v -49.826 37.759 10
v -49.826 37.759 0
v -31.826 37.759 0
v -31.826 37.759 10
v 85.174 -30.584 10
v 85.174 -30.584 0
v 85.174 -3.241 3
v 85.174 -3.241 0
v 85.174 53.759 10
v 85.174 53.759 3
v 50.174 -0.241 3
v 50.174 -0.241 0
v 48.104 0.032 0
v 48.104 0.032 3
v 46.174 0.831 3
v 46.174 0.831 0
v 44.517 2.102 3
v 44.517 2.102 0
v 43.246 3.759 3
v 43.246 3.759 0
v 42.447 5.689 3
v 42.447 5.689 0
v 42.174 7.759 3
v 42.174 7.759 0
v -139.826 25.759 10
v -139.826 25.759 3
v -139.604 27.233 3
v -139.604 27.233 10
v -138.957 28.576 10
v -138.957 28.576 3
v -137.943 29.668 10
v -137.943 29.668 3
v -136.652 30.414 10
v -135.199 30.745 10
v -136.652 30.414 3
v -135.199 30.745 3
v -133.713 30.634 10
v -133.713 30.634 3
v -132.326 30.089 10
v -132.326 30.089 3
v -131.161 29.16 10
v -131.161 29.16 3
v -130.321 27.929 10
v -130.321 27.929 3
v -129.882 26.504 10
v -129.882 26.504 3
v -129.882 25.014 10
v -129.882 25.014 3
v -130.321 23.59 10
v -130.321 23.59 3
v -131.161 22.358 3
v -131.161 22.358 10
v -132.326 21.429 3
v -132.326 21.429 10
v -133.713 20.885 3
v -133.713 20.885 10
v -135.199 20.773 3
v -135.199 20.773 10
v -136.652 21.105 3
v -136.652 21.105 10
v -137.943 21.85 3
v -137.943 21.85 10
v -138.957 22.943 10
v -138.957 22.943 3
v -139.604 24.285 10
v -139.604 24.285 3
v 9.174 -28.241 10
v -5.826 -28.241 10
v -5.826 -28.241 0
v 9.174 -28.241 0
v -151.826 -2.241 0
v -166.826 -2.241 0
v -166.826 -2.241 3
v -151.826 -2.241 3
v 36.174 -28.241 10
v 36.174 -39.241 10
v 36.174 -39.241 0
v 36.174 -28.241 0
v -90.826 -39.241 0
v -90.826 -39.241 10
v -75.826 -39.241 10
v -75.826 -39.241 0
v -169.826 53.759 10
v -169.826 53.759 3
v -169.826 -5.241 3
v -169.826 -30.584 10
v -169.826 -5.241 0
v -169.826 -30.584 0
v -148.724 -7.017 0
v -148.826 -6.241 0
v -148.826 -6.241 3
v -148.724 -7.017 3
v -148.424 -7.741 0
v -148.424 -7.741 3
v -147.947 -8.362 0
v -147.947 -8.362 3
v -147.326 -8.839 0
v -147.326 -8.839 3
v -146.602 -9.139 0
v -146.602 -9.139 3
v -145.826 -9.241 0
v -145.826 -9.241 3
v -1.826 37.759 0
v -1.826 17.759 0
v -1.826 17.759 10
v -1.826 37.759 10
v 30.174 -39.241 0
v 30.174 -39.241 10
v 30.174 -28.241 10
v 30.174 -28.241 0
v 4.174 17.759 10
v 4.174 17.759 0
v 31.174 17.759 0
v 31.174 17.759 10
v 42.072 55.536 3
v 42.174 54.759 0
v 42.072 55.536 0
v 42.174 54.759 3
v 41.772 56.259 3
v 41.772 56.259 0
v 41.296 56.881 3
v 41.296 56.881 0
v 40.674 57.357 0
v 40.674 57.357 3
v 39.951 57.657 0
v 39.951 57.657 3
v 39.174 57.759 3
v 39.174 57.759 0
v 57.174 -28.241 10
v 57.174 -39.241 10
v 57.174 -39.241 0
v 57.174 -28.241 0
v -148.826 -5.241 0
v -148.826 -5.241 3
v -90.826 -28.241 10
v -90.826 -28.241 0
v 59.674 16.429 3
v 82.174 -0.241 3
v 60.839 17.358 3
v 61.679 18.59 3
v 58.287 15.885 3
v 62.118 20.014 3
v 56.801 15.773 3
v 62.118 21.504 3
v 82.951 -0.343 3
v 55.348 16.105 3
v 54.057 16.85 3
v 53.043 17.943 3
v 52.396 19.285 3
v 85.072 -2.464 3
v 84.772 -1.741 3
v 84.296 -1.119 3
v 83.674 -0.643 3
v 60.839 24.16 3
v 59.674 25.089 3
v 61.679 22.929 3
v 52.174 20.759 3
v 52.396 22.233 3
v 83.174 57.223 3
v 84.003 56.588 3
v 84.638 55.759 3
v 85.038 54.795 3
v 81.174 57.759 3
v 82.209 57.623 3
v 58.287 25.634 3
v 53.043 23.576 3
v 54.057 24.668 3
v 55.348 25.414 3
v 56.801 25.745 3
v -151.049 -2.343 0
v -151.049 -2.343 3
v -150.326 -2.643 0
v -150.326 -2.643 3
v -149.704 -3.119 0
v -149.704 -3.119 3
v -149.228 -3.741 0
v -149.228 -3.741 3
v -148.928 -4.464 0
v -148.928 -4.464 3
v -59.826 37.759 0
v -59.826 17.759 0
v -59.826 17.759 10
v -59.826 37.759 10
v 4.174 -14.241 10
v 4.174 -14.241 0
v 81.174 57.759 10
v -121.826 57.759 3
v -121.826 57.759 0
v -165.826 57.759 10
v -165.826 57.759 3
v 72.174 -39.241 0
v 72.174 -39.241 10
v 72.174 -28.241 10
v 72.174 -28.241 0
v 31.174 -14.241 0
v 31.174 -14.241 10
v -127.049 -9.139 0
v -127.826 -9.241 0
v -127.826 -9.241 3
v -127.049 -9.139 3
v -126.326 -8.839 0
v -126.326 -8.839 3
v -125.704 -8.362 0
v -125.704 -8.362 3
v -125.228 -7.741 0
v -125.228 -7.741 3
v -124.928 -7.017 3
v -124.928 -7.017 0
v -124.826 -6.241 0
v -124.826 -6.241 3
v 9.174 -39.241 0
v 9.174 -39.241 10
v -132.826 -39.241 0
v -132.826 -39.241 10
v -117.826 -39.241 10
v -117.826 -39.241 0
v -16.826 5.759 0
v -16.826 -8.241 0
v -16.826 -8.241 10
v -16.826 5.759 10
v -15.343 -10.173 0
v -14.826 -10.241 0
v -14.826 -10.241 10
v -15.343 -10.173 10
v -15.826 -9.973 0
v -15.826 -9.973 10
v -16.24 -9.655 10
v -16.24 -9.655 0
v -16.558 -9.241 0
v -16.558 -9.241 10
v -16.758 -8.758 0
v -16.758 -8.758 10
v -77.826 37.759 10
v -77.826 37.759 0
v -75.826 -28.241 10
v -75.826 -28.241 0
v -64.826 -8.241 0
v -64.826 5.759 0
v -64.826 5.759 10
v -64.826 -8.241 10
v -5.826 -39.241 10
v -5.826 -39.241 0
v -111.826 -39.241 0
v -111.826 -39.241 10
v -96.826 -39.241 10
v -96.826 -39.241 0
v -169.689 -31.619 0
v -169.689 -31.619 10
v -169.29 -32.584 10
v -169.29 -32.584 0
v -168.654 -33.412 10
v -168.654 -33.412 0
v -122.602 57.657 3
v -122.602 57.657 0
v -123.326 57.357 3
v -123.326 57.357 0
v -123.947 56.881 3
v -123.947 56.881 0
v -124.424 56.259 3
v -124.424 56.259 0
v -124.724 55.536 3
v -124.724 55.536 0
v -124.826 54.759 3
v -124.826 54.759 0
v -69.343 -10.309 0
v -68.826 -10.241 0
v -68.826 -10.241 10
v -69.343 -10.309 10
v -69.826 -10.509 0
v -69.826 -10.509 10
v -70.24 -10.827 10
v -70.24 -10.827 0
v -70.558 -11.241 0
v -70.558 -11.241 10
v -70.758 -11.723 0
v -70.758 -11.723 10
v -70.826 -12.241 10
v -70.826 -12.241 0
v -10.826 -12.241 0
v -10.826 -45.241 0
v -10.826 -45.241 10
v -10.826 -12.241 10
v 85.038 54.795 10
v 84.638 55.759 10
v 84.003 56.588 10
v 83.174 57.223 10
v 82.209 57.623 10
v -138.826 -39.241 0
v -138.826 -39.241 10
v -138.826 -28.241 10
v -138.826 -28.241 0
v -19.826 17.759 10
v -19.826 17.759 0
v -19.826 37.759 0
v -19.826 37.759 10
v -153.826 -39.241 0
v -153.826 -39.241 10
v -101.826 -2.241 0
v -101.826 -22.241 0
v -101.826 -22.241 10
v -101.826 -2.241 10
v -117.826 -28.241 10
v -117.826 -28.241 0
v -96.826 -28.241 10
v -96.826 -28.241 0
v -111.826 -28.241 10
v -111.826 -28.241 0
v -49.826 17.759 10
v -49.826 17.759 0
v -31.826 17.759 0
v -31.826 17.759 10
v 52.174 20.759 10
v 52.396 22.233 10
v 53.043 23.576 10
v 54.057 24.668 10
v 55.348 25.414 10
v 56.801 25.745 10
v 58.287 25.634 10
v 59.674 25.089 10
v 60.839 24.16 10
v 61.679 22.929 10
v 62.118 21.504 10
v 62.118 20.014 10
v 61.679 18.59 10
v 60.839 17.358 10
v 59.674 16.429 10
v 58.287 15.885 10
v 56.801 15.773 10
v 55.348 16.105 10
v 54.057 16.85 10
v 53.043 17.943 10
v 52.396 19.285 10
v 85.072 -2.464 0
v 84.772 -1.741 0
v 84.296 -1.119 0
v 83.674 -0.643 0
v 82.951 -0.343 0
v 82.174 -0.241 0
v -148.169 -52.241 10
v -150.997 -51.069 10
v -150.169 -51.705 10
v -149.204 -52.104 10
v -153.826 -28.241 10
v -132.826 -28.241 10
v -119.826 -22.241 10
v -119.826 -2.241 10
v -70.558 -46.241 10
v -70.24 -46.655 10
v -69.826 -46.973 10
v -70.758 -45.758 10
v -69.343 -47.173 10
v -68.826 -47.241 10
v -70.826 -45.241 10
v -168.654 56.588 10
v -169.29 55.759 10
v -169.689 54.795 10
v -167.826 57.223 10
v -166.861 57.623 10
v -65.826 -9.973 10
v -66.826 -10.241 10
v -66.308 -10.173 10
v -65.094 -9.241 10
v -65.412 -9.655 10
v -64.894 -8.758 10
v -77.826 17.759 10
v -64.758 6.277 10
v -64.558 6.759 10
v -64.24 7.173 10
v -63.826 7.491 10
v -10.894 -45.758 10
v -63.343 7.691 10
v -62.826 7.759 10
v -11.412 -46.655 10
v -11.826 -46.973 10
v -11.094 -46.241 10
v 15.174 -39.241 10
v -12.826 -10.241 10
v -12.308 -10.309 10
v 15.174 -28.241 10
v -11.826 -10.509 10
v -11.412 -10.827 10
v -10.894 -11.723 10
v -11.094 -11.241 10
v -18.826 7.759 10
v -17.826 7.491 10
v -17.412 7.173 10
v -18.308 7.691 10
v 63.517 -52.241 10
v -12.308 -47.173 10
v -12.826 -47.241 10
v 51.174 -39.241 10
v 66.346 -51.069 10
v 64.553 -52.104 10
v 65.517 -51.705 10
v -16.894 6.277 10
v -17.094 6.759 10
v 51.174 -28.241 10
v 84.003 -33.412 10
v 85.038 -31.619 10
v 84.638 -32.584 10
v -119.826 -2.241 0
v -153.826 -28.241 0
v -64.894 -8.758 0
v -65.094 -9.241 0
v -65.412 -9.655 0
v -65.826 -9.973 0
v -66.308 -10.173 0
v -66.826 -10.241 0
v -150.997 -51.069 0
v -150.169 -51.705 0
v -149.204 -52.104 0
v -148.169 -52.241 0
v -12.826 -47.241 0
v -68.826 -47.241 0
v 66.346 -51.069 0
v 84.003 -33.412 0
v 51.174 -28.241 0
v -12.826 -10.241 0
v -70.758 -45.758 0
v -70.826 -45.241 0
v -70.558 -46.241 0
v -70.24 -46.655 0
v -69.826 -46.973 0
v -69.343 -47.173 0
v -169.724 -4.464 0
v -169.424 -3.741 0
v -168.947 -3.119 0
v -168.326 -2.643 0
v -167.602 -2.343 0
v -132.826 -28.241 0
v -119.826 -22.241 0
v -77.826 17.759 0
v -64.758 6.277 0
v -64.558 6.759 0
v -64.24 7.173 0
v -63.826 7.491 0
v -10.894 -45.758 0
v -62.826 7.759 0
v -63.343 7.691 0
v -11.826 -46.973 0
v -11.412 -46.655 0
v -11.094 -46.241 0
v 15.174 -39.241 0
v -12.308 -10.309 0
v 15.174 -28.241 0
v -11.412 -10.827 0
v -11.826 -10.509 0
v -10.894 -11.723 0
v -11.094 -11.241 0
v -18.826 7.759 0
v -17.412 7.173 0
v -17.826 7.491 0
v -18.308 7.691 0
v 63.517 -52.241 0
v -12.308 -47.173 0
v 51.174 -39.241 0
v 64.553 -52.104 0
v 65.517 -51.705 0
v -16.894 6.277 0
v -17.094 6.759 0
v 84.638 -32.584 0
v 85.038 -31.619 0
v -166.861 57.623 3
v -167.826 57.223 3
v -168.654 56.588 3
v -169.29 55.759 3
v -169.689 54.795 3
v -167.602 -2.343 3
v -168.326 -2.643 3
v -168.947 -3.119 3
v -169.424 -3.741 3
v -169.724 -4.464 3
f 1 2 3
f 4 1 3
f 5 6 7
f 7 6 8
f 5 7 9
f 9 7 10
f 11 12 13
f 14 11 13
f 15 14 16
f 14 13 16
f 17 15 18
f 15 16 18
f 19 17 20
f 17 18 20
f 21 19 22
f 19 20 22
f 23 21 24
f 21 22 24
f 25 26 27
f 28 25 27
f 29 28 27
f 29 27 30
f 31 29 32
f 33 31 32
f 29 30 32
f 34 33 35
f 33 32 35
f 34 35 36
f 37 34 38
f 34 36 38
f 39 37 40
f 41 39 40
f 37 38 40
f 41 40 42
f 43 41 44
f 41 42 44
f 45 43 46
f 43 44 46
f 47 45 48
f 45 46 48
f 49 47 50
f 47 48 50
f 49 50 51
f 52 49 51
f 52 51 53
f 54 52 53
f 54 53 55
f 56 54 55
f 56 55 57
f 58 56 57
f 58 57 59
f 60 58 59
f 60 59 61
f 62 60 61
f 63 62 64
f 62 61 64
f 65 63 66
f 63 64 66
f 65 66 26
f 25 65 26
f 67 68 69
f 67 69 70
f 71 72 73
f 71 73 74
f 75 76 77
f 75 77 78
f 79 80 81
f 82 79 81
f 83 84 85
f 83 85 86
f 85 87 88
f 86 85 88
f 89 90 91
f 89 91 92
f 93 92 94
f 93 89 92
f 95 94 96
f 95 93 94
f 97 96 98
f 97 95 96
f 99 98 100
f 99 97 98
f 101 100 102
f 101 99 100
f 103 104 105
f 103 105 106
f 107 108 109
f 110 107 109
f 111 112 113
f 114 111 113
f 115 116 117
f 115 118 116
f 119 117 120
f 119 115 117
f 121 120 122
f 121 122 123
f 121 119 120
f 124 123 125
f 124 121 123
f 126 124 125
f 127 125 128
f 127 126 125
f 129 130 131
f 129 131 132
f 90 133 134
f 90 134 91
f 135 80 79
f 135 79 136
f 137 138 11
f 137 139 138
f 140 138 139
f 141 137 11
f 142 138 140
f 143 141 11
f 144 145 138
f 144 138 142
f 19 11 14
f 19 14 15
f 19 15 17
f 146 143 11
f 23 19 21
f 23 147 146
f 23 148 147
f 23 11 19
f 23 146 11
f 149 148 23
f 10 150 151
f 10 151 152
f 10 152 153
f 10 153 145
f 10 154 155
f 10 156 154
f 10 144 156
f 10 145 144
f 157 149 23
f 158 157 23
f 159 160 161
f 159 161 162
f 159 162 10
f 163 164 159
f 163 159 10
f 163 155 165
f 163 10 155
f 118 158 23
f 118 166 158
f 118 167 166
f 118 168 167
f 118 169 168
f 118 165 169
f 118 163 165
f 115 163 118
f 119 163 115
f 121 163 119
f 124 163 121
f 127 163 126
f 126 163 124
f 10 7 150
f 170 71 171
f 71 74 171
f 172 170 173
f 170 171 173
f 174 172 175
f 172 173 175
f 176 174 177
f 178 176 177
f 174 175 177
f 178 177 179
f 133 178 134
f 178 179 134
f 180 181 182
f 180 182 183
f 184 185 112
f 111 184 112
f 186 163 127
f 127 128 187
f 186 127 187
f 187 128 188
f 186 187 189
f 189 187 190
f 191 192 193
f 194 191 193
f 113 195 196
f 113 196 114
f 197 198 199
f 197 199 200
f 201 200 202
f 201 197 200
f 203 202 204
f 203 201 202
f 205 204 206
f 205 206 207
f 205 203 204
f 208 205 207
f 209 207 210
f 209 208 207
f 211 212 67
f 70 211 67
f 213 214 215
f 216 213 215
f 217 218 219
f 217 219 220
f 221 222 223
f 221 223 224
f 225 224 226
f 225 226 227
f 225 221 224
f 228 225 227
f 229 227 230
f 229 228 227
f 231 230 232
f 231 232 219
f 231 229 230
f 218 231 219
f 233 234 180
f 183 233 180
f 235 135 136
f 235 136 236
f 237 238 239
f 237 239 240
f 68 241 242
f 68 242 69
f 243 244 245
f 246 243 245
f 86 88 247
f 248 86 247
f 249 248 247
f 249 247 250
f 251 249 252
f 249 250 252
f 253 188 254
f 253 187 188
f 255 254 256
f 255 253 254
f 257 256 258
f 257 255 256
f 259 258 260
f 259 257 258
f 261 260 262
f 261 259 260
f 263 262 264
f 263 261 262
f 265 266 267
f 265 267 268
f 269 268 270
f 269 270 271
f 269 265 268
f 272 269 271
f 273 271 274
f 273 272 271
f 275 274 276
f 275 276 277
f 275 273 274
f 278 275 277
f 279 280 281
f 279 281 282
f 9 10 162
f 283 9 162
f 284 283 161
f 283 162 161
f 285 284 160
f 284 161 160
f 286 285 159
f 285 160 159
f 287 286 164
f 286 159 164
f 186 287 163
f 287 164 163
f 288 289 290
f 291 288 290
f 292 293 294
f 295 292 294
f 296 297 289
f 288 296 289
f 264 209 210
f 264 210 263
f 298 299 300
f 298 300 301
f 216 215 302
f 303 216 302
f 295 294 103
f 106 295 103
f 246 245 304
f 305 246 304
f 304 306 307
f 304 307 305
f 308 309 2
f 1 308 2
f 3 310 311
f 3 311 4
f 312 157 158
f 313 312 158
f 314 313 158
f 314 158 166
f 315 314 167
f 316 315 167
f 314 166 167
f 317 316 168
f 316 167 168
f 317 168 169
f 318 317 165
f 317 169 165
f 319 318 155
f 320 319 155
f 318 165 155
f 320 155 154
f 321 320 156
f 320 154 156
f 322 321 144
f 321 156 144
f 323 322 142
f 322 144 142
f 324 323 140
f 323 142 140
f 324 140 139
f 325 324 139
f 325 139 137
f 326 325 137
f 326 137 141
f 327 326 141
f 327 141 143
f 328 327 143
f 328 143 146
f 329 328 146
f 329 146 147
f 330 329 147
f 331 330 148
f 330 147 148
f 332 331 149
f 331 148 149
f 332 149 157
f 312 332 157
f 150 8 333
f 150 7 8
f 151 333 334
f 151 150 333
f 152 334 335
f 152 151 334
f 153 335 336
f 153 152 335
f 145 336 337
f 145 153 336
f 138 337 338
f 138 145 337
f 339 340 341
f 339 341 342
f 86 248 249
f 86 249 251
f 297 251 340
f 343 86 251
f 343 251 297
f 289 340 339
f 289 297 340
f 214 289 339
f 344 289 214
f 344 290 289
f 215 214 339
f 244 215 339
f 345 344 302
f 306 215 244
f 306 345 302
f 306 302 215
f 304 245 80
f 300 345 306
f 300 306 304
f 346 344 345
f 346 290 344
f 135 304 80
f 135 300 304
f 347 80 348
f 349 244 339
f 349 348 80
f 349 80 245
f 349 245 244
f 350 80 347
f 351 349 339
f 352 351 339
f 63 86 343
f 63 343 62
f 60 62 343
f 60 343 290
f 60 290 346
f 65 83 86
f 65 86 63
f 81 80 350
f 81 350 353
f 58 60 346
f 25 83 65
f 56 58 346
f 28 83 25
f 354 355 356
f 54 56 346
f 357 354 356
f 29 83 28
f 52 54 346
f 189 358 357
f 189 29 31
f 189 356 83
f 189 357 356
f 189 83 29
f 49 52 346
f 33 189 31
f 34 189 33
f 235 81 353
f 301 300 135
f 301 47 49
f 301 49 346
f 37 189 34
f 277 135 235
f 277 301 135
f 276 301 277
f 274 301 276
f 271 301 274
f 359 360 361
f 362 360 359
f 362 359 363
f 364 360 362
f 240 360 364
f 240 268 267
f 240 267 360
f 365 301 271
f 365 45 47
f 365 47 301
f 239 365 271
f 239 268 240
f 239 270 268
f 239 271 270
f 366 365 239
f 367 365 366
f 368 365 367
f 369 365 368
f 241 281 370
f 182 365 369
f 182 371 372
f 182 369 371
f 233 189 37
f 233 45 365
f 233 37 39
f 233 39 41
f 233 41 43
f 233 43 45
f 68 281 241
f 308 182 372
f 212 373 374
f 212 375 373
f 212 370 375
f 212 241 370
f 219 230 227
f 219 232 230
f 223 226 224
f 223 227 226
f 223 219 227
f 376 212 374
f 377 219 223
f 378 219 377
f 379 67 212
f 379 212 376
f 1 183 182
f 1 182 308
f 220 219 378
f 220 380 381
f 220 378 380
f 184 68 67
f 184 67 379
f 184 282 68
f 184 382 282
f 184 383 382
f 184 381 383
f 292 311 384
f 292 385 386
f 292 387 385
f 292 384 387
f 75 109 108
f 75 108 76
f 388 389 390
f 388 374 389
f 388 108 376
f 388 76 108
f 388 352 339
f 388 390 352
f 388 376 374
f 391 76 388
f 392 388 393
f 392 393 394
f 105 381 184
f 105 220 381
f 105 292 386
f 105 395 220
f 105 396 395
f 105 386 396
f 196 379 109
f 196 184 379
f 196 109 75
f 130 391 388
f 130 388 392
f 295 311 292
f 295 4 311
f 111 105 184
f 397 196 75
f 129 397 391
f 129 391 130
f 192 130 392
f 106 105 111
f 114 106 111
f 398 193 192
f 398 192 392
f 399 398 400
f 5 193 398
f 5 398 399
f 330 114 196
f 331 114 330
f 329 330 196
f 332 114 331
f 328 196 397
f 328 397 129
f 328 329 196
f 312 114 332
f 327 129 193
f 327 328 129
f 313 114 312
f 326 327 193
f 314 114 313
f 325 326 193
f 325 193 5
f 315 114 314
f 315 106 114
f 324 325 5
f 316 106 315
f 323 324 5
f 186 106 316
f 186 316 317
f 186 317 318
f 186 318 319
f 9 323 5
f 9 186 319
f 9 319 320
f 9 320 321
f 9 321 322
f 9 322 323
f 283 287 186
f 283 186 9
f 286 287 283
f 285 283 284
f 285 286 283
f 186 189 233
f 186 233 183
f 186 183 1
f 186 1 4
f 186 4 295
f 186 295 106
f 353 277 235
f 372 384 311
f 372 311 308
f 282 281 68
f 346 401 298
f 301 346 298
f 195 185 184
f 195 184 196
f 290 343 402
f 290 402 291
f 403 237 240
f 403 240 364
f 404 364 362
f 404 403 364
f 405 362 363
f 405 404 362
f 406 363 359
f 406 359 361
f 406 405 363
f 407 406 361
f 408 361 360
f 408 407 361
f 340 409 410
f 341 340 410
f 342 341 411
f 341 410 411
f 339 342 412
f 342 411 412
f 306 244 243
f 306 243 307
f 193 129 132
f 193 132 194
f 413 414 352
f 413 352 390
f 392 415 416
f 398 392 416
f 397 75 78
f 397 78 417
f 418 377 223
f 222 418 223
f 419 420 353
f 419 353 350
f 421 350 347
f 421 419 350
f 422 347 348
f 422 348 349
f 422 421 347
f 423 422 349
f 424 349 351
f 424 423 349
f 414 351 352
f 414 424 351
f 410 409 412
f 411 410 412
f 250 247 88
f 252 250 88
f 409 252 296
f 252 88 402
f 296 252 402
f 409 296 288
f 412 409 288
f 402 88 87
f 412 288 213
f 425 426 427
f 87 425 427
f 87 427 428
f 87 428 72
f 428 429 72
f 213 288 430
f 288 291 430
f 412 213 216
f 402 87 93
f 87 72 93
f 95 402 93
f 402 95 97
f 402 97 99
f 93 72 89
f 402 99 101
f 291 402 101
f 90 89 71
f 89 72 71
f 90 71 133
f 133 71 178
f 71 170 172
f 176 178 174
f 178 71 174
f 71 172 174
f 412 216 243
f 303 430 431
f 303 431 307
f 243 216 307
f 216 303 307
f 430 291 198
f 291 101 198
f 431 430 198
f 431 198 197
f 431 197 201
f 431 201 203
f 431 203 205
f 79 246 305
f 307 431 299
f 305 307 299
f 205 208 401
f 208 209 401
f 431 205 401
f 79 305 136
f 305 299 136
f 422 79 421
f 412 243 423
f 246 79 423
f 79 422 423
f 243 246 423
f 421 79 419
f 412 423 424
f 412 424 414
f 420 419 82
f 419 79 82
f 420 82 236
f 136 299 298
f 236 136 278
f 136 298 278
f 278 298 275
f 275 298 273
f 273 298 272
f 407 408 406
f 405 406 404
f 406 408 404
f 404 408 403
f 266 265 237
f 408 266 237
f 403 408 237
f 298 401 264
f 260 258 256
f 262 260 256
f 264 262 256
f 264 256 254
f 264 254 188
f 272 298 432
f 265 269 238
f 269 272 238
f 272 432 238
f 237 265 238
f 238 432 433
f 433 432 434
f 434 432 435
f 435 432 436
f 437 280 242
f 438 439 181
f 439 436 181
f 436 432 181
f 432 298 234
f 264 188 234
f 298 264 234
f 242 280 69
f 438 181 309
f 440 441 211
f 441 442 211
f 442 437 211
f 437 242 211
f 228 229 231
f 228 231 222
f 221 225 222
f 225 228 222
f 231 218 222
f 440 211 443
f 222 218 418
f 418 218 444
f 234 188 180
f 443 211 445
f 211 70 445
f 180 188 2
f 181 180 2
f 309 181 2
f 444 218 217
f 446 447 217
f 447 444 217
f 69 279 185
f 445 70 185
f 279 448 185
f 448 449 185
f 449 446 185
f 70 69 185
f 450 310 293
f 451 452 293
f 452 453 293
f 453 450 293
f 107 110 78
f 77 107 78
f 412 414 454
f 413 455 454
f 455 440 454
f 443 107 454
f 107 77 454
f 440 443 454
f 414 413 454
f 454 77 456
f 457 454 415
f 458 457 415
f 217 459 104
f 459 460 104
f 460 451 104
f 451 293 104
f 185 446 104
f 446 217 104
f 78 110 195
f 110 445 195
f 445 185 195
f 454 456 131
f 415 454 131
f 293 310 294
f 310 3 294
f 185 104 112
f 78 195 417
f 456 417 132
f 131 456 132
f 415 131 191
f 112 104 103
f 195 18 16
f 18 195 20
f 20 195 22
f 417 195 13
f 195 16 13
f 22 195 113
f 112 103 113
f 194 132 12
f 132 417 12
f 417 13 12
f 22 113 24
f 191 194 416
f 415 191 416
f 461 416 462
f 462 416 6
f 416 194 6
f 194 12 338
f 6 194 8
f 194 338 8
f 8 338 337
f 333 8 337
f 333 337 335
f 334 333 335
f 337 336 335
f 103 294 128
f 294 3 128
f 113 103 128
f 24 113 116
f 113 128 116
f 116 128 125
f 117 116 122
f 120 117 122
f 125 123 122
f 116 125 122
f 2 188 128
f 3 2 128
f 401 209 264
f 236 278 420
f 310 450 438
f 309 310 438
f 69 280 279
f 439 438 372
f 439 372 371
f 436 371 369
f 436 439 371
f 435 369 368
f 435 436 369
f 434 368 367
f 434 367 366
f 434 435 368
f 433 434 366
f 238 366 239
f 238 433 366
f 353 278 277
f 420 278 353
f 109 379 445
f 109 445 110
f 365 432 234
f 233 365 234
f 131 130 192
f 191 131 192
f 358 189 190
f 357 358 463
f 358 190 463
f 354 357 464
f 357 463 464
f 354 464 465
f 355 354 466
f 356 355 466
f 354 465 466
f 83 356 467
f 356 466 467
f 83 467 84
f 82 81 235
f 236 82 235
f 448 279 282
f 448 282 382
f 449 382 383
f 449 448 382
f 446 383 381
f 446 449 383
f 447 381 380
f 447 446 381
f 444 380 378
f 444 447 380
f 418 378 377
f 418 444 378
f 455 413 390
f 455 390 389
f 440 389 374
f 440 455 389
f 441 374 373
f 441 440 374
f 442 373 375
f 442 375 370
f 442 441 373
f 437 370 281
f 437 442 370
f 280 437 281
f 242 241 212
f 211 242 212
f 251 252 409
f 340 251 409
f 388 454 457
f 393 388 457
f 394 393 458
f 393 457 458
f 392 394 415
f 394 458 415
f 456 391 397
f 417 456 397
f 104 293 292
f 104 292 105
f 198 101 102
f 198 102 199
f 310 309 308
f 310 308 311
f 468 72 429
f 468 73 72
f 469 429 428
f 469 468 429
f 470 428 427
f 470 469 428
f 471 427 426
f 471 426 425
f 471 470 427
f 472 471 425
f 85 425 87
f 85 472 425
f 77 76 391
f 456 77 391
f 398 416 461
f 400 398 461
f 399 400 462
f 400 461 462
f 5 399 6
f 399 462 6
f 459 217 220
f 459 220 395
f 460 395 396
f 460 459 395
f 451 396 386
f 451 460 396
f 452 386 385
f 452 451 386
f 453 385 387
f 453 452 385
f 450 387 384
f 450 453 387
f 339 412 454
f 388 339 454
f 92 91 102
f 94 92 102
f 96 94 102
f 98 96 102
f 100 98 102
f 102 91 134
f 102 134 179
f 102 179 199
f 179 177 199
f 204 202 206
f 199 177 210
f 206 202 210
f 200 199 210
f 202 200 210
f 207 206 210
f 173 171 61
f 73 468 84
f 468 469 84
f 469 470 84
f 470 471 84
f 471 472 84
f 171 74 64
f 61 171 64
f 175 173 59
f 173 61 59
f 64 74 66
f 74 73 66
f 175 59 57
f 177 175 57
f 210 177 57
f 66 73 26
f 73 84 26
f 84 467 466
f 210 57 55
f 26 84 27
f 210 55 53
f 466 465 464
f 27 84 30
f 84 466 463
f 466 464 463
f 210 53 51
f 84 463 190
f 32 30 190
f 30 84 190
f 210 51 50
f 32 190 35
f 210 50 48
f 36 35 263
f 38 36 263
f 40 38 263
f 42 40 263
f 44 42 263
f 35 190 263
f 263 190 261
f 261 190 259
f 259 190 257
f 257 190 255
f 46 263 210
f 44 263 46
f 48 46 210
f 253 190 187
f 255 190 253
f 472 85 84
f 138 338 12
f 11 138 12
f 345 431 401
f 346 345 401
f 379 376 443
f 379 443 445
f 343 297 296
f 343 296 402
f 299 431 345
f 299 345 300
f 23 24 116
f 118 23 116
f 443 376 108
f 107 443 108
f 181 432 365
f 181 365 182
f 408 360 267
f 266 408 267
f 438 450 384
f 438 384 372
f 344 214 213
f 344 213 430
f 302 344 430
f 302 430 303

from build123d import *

# Parameters (mm, degrees)
SKETCH1_W           = 18
SKETCH1_H           = 20
SKETCH1_W_2         = 27
SKETCH1_H_2         = 32
BOSS_EXTRUDE1_DEPTH = 10
SKETCH2_W           = 15
SKETCH2_H           = 11
CUT_EXTRUDE1_DEPTH  = 10
CUT_EXTRUDE2_DEPTH  = 3
FILLET1_R           = 3
FILLET2_R           = 3
FILLET3_R           = 3
FILLET4_R           = 3
FILLET5_R           = 3
CUT_EXTRUDE3_DEPTH  = 10
SKETCH5_R           = 5
CUT_EXTRUDE4_DEPTH  = 7


with BuildPart() as part:
    # Sketch1 → Boss-Extrude1 (new body)
    with BuildSketch(Plane.XY):
        with BuildLine():
            Line((-168.654215956, -33.412313616), (-150.997361707, -51.069167865))
            ThreePointArc((-150.997361707, -51.069167865), (-149.699668311, -51.936258871), (-148.168934582, -52.240740741))
            Line((-148.168934582, -52.240740741), (63.517356919, -52.240740741))
            ThreePointArc((63.517356919, -52.240740741), (65.048090649, -51.936258871), (66.345784044, -51.069167865))
            Line((66.345784044, -51.069167865), (84.002638293, -33.412313616))
            ThreePointArc((84.002638293, -33.412313616), (84.869729299, -32.114620221), (85.174211169, -30.583886491))
            Line((85.174211169, -30.583886491), (85.174211169, 53.759259259))
            ThreePointArc((85.174211169, 53.759259259), (84.002638293, 56.587686384), (81.174211169, 57.759259259))
            Line((81.174211169, 57.759259259), (-165.825788831, 57.759259259))
            ThreePointArc((-165.825788831, 57.759259259), (-168.654215956, 56.587686384), (-169.825788831, 53.759259259))
            Line((-169.825788831, 53.759259259), (-169.825788831, -30.583886491))
            ThreePointArc((-169.825788831, -30.583886491), (-169.521306961, -32.114620221), (-168.654215956, -33.412313616))
        make_face()
        with Locations((-68.825788831, 27.759259259)):
            Rectangle(SKETCH1_W, SKETCH1_H, mode=Mode.SUBTRACT)
        with Locations((-40.825788831, 27.759259259)):
            Rectangle(SKETCH1_W, SKETCH1_H, mode=Mode.SUBTRACT)
        with Locations((-10.825788831, 27.759259259)):
            Rectangle(SKETCH1_W, SKETCH1_H, mode=Mode.SUBTRACT)
        with Locations((-110.825788831, -12.240740741)):
            Rectangle(SKETCH1_W, SKETCH1_H, mode=Mode.SUBTRACT)
        with Locations((17.674211169, 1.759259259)):
            Rectangle(SKETCH1_W_2, SKETCH1_H_2, mode=Mode.SUBTRACT)
    extrude(amount=BOSS_EXTRUDE1_DEPTH)

    # Sketch2 → Cut-Extrude1 (cut)
    with BuildSketch(Plane.XY.offset(10)):
        with Locations((-146.325788831, -33.740740741)):
            Rectangle(SKETCH2_W, SKETCH2_H)
        with Locations((-125.325788831, -33.740740741)):
            Rectangle(SKETCH2_W, SKETCH2_H)
        with Locations((-104.325788831, -33.740740741)):
            Rectangle(SKETCH2_W, SKETCH2_H)
        with Locations((-83.325788831, -33.740740741)):
            Rectangle(SKETCH2_W, SKETCH2_H)
        with Locations((1.674211169, -33.740740741)):
            Rectangle(SKETCH2_W, SKETCH2_H)
        with Locations((22.674211169, -33.740740741)):
            Rectangle(SKETCH2_W, SKETCH2_H)
        with Locations((43.674211169, -33.740740741)):
            Rectangle(SKETCH2_W, SKETCH2_H)
        with Locations((64.674211169, -33.740740741)):
            Rectangle(SKETCH2_W, SKETCH2_H)
    extrude(amount=-CUT_EXTRUDE1_DEPTH, mode=Mode.SUBTRACT)

    # Sketch3 → Cut-Extrude2 (cut)
    with BuildSketch(Plane(origin=(0, 0, 0), x_dir=(-1, 0, 0), z_dir=(0, 0, -1))):
        with BuildLine():
            Line((-42.174211169, 57.759259259), (-85.174211169, 57.759259259))
            Line((-85.174211169, 57.759259259), (-85.174211169, -0.240740741))
            Line((-85.174211169, -0.240740741), (-50.174211169, -0.240740741))
            ThreePointArc((-50.174211169, -0.240740741), (-44.517356919, 2.10240501), (-42.174211169, 7.759259259))
            Line((-42.174211169, 7.759259259), (-42.174211169, 57.759259259))
        make_face()
        with BuildLine():
            Line((124.825788831, 57.759259259), (169.825788831, 57.759259259))
            Line((169.825788831, 57.759259259), (169.825788831, -2.240740741))
            Line((169.825788831, -2.240740741), (148.825788831, -2.240740741))
            Line((148.825788831, -2.240740741), (148.825788831, -6.240740741))
            ThreePointArc((148.825788831, -6.240740741), (147.947109175, -8.362061084), (145.825788831, -9.240740741))
            Line((145.825788831, -9.240740741), (127.825788831, -9.240740741))
            ThreePointArc((127.825788831, -9.240740741), (125.704468488, -8.362061084), (124.825788831, -6.240740741))
            Line((124.825788831, -6.240740741), (124.825788831, -1.240740741))
            Line((124.825788831, -1.240740741), (124.825788831, 57.759259259))
        make_face()
    extrude(amount=-CUT_EXTRUDE2_DEPTH, mode=Mode.SUBTRACT)

    # Fillet1
    fillet1_edges = [part.edges().sort_by_distance(p)[0] for p in [
        (-148.825788831, -2.240740741, 1.5),
    ]]
    fillet(fillet1_edges, radius=FILLET1_R)

    # Fillet2
    fillet2_edges = [part.edges().sort_by_distance(p)[0] for p in [
        (-169.825788831, -2.240740741, 1.5),
    ]]
    fillet(fillet2_edges, radius=FILLET2_R)

    # Fillet3
    fillet3_edges = [part.edges().sort_by_distance(p)[0] for p in [
        (-124.825788831, 57.759259259, 1.5),
    ]]
    fillet(fillet3_edges, radius=FILLET3_R)

    # Fillet4
    fillet4_edges = [part.edges().sort_by_distance(p)[0] for p in [
        (42.174211169, 57.759259259, 1.5),
    ]]
    fillet(fillet4_edges, radius=FILLET4_R)

    # Fillet5
    fillet5_edges = [part.edges().sort_by_distance(p)[0] for p in [
        (85.174211169, -0.240740741, 1.5),
    ]]
    fillet(fillet5_edges, radius=FILLET5_R)

    # Sketch4 → Cut-Extrude3 (cut)
    with BuildSketch(Plane(origin=(0, 0, 0), x_dir=(-1, 0, 0), z_dir=(0, 0, -1))):
        with BuildLine():
            Line((68.825788831, -47.240740741), (12.825788831, -47.240740741))
            ThreePointArc((12.825788831, -47.240740741), (11.411575269, -46.654954303), (10.825788831, -45.240740741))
            Line((10.825788831, -45.240740741), (10.825788831, -12.240740741))
            ThreePointArc((10.825788831, -12.240740741), (11.411575269, -10.826527178), (12.825788831, -10.240740741))
            Line((12.825788831, -10.240740741), (14.825788831, -10.240740741))
            ThreePointArc((14.825788831, -10.240740741), (16.240002394, -9.654954303), (16.825788831, -8.240740741))
            Line((16.825788831, -8.240740741), (16.825788831, 5.759259259))
            ThreePointArc((16.825788831, 5.759259259), (17.411575269, 7.173472822), (18.825788831, 7.759259259))
            Line((18.825788831, 7.759259259), (62.825788831, 7.759259259))
            ThreePointArc((62.825788831, 7.759259259), (64.240002394, 7.173472822), (64.825788831, 5.759259259))
            Line((64.825788831, 5.759259259), (64.825788831, -8.240740741))
            ThreePointArc((64.825788831, -8.240740741), (65.411575269, -9.654954303), (66.825788831, -10.240740741))
            Line((66.825788831, -10.240740741), (68.825788831, -10.240740741))
            ThreePointArc((68.825788831, -10.240740741), (70.240002394, -10.826527178), (70.825788831, -12.240740741))
            Line((70.825788831, -12.240740741), (70.825788831, -45.240740741))
            ThreePointArc((70.825788831, -45.240740741), (70.240002394, -46.654954303), (68.825788831, -47.240740741))
        make_face()
    extrude(amount=-CUT_EXTRUDE3_DEPTH, mode=Mode.SUBTRACT)

    # Sketch5 → Cut-Extrude4 (cut)
    with BuildSketch(Plane(origin=(0, 0, 3), x_dir=(-1, 0, 0), z_dir=(0, 0, -1))):
        with Locations((-57.174211169, 20.759259259)):
            Circle(SKETCH5_R)
        with Locations((134.825788831, 25.759259259)):
            Circle(SKETCH5_R)
    extrude(amount=-CUT_EXTRUDE4_DEPTH, mode=Mode.SUBTRACT)


solid = part.part
